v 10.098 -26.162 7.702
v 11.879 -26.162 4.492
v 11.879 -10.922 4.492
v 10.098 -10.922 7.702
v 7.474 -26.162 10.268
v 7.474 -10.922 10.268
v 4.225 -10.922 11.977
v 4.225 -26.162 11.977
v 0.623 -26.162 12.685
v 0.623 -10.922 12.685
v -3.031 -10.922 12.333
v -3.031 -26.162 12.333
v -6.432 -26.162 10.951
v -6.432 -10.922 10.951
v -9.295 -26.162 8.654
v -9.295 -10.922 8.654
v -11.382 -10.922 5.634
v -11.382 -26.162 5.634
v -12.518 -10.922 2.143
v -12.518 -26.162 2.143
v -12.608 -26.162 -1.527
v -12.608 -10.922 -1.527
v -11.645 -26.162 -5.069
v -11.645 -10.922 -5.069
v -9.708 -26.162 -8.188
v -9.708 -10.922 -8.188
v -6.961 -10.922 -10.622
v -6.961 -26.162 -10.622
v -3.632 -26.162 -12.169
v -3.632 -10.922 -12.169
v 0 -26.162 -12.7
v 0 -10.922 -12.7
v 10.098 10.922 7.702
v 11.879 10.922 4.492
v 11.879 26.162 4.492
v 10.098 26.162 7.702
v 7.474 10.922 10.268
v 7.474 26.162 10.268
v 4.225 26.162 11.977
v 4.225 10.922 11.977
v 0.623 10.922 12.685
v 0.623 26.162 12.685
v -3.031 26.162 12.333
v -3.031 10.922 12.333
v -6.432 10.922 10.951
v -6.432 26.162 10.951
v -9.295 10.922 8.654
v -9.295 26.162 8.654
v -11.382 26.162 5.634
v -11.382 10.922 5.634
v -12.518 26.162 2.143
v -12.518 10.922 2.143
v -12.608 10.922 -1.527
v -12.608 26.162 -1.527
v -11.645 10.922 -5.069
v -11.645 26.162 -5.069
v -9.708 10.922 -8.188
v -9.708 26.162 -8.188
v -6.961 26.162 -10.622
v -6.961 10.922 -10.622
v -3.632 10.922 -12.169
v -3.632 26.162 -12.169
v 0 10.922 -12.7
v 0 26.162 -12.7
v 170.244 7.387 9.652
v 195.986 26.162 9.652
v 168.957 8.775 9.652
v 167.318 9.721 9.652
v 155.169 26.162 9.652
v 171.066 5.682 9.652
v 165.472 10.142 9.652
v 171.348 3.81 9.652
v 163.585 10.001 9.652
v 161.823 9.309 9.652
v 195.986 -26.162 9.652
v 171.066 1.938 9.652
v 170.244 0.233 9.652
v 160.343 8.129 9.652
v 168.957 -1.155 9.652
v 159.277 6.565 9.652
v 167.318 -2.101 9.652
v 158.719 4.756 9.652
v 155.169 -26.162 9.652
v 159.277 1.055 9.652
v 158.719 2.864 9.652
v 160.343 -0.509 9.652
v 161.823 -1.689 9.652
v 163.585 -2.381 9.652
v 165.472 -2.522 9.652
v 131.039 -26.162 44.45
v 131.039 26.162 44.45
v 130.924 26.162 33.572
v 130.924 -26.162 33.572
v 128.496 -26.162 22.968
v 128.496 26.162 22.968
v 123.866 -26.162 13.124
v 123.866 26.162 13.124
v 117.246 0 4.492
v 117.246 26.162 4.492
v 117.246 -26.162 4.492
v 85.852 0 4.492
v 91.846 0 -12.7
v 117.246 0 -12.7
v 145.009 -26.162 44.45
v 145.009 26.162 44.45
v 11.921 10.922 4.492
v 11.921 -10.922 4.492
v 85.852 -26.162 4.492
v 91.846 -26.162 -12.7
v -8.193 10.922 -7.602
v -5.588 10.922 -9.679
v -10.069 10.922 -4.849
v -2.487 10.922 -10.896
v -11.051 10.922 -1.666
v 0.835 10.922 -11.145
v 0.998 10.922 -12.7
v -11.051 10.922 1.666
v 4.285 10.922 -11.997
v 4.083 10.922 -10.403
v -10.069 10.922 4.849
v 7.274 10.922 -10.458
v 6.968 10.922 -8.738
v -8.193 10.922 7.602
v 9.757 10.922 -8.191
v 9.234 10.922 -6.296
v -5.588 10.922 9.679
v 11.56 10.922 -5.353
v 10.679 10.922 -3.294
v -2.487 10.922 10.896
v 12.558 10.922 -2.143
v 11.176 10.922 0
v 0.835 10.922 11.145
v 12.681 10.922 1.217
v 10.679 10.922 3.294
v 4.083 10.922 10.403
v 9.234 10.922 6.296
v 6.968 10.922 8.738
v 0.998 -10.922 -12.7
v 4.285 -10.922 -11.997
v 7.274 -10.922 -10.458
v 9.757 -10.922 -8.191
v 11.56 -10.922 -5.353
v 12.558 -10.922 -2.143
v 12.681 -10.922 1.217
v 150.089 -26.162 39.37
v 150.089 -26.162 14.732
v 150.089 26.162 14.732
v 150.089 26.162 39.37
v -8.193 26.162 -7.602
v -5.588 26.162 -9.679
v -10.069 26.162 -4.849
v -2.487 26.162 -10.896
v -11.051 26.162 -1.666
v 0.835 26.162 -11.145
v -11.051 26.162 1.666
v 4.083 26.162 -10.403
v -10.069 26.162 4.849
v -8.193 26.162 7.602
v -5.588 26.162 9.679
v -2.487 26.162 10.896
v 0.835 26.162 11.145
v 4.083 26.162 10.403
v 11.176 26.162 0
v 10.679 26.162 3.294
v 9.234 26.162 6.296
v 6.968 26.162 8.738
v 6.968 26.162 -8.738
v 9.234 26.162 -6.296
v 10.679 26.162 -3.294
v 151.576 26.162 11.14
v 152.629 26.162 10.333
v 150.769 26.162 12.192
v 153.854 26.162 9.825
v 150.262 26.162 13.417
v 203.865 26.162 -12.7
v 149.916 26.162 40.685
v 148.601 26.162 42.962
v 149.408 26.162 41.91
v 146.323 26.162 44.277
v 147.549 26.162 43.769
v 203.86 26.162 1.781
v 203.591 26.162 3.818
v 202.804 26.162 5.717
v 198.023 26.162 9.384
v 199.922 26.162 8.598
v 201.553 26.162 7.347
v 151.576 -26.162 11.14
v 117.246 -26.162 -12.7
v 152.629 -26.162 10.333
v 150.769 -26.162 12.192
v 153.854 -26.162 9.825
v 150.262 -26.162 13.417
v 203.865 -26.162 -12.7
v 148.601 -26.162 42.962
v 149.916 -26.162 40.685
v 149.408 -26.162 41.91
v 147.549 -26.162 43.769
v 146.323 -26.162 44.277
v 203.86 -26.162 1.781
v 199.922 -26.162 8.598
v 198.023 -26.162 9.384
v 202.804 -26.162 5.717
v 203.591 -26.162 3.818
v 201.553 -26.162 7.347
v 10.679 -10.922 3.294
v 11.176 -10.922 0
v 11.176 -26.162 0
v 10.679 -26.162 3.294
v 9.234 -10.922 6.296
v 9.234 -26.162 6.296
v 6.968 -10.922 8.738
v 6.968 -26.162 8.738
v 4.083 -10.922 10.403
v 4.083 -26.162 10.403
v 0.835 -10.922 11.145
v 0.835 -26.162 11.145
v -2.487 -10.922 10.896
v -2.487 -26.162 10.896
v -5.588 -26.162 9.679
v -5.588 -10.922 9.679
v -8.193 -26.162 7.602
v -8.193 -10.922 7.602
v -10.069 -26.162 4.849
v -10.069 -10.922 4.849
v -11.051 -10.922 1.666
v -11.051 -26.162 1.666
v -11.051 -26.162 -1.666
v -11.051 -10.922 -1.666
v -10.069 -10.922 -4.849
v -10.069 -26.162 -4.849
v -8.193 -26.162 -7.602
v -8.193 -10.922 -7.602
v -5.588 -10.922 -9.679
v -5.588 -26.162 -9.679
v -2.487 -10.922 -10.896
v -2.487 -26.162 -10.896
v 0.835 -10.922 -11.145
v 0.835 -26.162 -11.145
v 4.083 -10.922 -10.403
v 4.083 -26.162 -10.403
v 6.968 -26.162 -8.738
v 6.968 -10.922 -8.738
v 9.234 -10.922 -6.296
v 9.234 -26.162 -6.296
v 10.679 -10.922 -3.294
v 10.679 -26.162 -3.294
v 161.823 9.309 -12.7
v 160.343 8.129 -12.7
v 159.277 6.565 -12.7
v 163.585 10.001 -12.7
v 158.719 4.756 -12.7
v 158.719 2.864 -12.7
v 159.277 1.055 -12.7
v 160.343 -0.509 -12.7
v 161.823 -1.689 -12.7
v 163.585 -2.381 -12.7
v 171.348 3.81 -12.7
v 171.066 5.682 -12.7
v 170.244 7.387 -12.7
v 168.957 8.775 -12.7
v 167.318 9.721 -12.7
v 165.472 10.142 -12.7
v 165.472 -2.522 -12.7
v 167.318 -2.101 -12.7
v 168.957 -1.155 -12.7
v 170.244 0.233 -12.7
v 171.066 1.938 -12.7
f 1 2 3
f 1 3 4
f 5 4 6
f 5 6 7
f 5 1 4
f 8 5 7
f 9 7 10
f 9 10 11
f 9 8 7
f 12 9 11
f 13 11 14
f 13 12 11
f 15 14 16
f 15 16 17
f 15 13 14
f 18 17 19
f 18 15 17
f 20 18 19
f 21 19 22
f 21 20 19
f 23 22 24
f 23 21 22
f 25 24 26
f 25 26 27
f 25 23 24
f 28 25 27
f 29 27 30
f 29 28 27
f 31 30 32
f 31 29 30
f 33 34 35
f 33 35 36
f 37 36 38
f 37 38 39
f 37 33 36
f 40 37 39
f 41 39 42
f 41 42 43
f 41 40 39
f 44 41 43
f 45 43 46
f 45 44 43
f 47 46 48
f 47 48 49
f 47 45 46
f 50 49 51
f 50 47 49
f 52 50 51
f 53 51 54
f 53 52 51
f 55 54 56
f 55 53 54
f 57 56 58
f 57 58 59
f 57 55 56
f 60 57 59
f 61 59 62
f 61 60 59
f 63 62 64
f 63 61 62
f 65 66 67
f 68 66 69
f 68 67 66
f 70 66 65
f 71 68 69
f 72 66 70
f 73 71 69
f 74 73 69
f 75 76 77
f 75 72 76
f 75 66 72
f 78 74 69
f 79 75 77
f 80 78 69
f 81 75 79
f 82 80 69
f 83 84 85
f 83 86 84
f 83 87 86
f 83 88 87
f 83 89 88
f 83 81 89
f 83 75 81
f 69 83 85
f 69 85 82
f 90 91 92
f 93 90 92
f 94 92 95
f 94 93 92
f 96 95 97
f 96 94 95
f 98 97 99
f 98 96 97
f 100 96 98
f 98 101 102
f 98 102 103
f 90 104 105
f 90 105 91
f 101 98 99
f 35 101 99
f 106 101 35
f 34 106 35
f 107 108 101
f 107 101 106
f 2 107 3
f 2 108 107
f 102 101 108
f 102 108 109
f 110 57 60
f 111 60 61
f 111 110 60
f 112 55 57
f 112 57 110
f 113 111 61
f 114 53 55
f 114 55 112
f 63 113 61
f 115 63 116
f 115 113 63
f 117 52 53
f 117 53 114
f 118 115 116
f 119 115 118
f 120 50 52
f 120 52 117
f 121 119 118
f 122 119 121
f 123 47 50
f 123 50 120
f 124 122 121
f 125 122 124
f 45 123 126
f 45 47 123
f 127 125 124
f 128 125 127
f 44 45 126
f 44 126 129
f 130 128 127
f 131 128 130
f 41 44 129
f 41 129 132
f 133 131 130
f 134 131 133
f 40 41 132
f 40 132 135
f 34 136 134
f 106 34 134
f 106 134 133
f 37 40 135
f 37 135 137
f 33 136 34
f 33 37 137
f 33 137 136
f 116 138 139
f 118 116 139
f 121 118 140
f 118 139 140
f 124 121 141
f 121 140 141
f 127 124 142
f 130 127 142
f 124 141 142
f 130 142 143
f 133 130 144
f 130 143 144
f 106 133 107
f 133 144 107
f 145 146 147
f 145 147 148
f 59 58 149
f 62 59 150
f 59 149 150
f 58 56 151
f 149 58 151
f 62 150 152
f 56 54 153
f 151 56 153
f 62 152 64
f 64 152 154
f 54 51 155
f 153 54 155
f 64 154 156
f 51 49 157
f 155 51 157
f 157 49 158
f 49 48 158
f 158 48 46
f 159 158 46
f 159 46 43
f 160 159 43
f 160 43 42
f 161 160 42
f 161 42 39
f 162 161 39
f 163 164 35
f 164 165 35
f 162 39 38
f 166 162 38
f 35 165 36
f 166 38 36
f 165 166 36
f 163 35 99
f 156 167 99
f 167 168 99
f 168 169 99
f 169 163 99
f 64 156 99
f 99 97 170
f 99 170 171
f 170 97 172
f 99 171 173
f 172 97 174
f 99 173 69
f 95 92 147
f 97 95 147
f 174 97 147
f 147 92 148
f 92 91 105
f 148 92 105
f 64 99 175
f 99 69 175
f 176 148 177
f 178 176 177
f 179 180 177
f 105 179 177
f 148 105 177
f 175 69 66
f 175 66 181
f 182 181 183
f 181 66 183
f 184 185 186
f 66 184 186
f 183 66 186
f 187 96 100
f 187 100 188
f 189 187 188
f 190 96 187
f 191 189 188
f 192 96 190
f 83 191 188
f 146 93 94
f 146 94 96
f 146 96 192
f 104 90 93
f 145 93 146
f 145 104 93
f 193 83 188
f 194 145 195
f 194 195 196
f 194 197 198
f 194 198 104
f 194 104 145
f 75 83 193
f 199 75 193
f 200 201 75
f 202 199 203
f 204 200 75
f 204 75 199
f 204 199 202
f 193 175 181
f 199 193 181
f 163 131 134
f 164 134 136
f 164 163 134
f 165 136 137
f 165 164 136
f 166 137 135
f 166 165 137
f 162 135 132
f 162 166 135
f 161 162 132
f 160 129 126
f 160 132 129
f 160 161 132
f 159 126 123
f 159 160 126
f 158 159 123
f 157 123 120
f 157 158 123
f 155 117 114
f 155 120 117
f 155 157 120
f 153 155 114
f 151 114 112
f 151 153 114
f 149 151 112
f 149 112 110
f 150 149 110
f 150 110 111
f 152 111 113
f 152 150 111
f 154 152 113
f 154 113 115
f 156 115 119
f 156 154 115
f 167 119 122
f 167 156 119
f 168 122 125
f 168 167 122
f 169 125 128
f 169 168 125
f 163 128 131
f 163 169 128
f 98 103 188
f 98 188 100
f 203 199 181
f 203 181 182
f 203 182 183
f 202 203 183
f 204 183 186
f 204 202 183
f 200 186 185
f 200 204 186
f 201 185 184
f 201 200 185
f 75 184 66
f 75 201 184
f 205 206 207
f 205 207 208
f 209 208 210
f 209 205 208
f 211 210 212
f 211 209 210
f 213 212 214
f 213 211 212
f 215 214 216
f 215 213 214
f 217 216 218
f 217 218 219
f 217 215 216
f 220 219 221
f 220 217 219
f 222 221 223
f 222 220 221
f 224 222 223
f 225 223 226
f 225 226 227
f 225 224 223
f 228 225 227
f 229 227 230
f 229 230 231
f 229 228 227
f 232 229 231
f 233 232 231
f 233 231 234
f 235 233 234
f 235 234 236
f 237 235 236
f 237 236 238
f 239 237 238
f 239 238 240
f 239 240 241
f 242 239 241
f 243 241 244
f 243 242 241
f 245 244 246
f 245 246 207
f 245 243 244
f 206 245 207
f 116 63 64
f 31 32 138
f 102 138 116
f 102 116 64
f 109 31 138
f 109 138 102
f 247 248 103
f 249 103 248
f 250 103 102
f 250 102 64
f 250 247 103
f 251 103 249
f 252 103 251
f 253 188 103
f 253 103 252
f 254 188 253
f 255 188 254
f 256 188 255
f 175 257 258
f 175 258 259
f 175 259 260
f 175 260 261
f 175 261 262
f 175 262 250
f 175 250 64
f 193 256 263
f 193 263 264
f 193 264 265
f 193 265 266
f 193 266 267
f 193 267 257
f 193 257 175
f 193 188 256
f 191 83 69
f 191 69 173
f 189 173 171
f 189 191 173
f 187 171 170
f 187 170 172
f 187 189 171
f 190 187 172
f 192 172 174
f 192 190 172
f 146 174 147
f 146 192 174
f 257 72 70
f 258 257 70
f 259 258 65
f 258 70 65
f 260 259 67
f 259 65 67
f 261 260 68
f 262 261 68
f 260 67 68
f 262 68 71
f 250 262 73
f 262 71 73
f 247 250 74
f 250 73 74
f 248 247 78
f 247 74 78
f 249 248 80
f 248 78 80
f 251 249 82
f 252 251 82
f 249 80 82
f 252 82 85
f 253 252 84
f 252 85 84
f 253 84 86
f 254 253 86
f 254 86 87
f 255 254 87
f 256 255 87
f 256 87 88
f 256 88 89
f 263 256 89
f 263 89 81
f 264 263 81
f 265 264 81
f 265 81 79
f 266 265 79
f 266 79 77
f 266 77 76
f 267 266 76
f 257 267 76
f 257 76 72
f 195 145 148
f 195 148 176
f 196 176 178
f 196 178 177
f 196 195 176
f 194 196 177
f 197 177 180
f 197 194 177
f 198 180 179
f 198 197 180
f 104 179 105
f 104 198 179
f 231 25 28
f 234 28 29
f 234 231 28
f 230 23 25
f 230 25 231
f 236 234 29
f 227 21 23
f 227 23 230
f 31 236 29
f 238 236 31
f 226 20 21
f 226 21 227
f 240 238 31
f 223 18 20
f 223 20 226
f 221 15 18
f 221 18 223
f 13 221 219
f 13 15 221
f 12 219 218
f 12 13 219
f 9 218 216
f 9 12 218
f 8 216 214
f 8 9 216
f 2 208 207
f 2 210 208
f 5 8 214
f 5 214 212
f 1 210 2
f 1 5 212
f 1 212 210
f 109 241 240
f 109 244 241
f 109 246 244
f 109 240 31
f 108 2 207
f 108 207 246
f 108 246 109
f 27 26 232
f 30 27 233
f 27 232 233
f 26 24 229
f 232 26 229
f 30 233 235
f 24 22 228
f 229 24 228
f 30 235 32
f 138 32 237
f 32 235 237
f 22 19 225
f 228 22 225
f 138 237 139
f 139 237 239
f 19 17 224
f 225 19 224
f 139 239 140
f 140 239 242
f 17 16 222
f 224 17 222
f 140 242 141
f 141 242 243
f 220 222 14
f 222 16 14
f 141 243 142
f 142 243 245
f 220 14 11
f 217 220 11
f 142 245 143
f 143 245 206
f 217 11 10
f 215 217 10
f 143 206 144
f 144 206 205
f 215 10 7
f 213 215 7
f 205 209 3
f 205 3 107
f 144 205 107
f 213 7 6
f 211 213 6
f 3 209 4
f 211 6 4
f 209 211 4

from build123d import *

# Parameters (mm, degrees)
F0_R     = 11.176
F1_DEPTH = 26.162
F2_DEPTH = 26.163
F3_R     = 12.739133
F4_DEPTH = 10.922
F5_R     = 6.35
F6_DEPTH = 22.353


with BuildPart() as f1:
    # F0 (on Front) → F1 (new body, symmetric)
    with BuildSketch(Plane.XZ):
        with BuildLine():
            Line((85.852, 4.49157), (11.879217, 4.49157))
            ThreePointArc((11.879217, 4.49157), (-10.448276, 7.219663), (0, -12.7))
            Line((0, -12.7), (91.8464, -12.7))
            Line((91.8464, -12.7), (85.852, 4.49157))
        make_face()
        Circle(F0_R, mode=Mode.SUBTRACT)
        Polygon((117.2464, 4.49157), (85.852, 4.49157), (91.8464, -12.7), (117.2464, -12.7), (117.2464, 1.780633), align=None)
        Polygon((117.2464, 1.780633), (117.2464, -12.7), (203.864659, -12.7), (203.859816, 1.780633), align=None)
        with BuildLine():
            ThreePointArc((131.0386, 44.45), (128.496139, 22.968067), (117.2464, 4.49157))
            Line((117.2464, 4.49157), (117.2464, 1.780633))
            Line((117.2464, 1.780633), (203.859816, 1.780633))
            ThreePointArc((203.859816, 1.780633), (201.552644, 7.34669), (195.985816, 9.652))
            Line((195.985816, 9.652), (155.1686, 9.652))
            ThreePointArc((155.1686, 9.652), (151.576498, 11.139898), (150.0886, 14.732))
            Line((150.0886, 14.732), (150.0886, 39.37))
            ThreePointArc((150.0886, 39.37), (148.600702, 42.962102), (145.0086, 44.45))
            Line((145.0086, 44.45), (131.0386, 44.45))
        make_face()
    extrude(amount=F1_DEPTH, both=True)

    # F0 (on Front) → F2 (cut, through all)
    with BuildSketch(Plane.XZ):
        Polygon((117.2464, 4.49157), (85.852, 4.49157), (91.8464, -12.7), (117.2464, -12.7), (117.2464, 1.780633), align=None)
    extrude(amount=F2_DEPTH, mode=Mode.SUBTRACT)

    # F3 (on Front) → F4 (cut, symmetric)
    with BuildSketch(Plane.XZ):
        Circle(F3_R)
    extrude(amount=F4_DEPTH, both=True, mode=Mode.SUBTRACT)

    # F5 (on face) → F6 (cut, through all)
    with BuildSketch(Plane.XY.offset(9.652)):
        with Locations((164.997816, 3.81)):
            Circle(F5_R)
    extrude(amount=-F6_DEPTH, mode=Mode.SUBTRACT)


solid = f1.part
